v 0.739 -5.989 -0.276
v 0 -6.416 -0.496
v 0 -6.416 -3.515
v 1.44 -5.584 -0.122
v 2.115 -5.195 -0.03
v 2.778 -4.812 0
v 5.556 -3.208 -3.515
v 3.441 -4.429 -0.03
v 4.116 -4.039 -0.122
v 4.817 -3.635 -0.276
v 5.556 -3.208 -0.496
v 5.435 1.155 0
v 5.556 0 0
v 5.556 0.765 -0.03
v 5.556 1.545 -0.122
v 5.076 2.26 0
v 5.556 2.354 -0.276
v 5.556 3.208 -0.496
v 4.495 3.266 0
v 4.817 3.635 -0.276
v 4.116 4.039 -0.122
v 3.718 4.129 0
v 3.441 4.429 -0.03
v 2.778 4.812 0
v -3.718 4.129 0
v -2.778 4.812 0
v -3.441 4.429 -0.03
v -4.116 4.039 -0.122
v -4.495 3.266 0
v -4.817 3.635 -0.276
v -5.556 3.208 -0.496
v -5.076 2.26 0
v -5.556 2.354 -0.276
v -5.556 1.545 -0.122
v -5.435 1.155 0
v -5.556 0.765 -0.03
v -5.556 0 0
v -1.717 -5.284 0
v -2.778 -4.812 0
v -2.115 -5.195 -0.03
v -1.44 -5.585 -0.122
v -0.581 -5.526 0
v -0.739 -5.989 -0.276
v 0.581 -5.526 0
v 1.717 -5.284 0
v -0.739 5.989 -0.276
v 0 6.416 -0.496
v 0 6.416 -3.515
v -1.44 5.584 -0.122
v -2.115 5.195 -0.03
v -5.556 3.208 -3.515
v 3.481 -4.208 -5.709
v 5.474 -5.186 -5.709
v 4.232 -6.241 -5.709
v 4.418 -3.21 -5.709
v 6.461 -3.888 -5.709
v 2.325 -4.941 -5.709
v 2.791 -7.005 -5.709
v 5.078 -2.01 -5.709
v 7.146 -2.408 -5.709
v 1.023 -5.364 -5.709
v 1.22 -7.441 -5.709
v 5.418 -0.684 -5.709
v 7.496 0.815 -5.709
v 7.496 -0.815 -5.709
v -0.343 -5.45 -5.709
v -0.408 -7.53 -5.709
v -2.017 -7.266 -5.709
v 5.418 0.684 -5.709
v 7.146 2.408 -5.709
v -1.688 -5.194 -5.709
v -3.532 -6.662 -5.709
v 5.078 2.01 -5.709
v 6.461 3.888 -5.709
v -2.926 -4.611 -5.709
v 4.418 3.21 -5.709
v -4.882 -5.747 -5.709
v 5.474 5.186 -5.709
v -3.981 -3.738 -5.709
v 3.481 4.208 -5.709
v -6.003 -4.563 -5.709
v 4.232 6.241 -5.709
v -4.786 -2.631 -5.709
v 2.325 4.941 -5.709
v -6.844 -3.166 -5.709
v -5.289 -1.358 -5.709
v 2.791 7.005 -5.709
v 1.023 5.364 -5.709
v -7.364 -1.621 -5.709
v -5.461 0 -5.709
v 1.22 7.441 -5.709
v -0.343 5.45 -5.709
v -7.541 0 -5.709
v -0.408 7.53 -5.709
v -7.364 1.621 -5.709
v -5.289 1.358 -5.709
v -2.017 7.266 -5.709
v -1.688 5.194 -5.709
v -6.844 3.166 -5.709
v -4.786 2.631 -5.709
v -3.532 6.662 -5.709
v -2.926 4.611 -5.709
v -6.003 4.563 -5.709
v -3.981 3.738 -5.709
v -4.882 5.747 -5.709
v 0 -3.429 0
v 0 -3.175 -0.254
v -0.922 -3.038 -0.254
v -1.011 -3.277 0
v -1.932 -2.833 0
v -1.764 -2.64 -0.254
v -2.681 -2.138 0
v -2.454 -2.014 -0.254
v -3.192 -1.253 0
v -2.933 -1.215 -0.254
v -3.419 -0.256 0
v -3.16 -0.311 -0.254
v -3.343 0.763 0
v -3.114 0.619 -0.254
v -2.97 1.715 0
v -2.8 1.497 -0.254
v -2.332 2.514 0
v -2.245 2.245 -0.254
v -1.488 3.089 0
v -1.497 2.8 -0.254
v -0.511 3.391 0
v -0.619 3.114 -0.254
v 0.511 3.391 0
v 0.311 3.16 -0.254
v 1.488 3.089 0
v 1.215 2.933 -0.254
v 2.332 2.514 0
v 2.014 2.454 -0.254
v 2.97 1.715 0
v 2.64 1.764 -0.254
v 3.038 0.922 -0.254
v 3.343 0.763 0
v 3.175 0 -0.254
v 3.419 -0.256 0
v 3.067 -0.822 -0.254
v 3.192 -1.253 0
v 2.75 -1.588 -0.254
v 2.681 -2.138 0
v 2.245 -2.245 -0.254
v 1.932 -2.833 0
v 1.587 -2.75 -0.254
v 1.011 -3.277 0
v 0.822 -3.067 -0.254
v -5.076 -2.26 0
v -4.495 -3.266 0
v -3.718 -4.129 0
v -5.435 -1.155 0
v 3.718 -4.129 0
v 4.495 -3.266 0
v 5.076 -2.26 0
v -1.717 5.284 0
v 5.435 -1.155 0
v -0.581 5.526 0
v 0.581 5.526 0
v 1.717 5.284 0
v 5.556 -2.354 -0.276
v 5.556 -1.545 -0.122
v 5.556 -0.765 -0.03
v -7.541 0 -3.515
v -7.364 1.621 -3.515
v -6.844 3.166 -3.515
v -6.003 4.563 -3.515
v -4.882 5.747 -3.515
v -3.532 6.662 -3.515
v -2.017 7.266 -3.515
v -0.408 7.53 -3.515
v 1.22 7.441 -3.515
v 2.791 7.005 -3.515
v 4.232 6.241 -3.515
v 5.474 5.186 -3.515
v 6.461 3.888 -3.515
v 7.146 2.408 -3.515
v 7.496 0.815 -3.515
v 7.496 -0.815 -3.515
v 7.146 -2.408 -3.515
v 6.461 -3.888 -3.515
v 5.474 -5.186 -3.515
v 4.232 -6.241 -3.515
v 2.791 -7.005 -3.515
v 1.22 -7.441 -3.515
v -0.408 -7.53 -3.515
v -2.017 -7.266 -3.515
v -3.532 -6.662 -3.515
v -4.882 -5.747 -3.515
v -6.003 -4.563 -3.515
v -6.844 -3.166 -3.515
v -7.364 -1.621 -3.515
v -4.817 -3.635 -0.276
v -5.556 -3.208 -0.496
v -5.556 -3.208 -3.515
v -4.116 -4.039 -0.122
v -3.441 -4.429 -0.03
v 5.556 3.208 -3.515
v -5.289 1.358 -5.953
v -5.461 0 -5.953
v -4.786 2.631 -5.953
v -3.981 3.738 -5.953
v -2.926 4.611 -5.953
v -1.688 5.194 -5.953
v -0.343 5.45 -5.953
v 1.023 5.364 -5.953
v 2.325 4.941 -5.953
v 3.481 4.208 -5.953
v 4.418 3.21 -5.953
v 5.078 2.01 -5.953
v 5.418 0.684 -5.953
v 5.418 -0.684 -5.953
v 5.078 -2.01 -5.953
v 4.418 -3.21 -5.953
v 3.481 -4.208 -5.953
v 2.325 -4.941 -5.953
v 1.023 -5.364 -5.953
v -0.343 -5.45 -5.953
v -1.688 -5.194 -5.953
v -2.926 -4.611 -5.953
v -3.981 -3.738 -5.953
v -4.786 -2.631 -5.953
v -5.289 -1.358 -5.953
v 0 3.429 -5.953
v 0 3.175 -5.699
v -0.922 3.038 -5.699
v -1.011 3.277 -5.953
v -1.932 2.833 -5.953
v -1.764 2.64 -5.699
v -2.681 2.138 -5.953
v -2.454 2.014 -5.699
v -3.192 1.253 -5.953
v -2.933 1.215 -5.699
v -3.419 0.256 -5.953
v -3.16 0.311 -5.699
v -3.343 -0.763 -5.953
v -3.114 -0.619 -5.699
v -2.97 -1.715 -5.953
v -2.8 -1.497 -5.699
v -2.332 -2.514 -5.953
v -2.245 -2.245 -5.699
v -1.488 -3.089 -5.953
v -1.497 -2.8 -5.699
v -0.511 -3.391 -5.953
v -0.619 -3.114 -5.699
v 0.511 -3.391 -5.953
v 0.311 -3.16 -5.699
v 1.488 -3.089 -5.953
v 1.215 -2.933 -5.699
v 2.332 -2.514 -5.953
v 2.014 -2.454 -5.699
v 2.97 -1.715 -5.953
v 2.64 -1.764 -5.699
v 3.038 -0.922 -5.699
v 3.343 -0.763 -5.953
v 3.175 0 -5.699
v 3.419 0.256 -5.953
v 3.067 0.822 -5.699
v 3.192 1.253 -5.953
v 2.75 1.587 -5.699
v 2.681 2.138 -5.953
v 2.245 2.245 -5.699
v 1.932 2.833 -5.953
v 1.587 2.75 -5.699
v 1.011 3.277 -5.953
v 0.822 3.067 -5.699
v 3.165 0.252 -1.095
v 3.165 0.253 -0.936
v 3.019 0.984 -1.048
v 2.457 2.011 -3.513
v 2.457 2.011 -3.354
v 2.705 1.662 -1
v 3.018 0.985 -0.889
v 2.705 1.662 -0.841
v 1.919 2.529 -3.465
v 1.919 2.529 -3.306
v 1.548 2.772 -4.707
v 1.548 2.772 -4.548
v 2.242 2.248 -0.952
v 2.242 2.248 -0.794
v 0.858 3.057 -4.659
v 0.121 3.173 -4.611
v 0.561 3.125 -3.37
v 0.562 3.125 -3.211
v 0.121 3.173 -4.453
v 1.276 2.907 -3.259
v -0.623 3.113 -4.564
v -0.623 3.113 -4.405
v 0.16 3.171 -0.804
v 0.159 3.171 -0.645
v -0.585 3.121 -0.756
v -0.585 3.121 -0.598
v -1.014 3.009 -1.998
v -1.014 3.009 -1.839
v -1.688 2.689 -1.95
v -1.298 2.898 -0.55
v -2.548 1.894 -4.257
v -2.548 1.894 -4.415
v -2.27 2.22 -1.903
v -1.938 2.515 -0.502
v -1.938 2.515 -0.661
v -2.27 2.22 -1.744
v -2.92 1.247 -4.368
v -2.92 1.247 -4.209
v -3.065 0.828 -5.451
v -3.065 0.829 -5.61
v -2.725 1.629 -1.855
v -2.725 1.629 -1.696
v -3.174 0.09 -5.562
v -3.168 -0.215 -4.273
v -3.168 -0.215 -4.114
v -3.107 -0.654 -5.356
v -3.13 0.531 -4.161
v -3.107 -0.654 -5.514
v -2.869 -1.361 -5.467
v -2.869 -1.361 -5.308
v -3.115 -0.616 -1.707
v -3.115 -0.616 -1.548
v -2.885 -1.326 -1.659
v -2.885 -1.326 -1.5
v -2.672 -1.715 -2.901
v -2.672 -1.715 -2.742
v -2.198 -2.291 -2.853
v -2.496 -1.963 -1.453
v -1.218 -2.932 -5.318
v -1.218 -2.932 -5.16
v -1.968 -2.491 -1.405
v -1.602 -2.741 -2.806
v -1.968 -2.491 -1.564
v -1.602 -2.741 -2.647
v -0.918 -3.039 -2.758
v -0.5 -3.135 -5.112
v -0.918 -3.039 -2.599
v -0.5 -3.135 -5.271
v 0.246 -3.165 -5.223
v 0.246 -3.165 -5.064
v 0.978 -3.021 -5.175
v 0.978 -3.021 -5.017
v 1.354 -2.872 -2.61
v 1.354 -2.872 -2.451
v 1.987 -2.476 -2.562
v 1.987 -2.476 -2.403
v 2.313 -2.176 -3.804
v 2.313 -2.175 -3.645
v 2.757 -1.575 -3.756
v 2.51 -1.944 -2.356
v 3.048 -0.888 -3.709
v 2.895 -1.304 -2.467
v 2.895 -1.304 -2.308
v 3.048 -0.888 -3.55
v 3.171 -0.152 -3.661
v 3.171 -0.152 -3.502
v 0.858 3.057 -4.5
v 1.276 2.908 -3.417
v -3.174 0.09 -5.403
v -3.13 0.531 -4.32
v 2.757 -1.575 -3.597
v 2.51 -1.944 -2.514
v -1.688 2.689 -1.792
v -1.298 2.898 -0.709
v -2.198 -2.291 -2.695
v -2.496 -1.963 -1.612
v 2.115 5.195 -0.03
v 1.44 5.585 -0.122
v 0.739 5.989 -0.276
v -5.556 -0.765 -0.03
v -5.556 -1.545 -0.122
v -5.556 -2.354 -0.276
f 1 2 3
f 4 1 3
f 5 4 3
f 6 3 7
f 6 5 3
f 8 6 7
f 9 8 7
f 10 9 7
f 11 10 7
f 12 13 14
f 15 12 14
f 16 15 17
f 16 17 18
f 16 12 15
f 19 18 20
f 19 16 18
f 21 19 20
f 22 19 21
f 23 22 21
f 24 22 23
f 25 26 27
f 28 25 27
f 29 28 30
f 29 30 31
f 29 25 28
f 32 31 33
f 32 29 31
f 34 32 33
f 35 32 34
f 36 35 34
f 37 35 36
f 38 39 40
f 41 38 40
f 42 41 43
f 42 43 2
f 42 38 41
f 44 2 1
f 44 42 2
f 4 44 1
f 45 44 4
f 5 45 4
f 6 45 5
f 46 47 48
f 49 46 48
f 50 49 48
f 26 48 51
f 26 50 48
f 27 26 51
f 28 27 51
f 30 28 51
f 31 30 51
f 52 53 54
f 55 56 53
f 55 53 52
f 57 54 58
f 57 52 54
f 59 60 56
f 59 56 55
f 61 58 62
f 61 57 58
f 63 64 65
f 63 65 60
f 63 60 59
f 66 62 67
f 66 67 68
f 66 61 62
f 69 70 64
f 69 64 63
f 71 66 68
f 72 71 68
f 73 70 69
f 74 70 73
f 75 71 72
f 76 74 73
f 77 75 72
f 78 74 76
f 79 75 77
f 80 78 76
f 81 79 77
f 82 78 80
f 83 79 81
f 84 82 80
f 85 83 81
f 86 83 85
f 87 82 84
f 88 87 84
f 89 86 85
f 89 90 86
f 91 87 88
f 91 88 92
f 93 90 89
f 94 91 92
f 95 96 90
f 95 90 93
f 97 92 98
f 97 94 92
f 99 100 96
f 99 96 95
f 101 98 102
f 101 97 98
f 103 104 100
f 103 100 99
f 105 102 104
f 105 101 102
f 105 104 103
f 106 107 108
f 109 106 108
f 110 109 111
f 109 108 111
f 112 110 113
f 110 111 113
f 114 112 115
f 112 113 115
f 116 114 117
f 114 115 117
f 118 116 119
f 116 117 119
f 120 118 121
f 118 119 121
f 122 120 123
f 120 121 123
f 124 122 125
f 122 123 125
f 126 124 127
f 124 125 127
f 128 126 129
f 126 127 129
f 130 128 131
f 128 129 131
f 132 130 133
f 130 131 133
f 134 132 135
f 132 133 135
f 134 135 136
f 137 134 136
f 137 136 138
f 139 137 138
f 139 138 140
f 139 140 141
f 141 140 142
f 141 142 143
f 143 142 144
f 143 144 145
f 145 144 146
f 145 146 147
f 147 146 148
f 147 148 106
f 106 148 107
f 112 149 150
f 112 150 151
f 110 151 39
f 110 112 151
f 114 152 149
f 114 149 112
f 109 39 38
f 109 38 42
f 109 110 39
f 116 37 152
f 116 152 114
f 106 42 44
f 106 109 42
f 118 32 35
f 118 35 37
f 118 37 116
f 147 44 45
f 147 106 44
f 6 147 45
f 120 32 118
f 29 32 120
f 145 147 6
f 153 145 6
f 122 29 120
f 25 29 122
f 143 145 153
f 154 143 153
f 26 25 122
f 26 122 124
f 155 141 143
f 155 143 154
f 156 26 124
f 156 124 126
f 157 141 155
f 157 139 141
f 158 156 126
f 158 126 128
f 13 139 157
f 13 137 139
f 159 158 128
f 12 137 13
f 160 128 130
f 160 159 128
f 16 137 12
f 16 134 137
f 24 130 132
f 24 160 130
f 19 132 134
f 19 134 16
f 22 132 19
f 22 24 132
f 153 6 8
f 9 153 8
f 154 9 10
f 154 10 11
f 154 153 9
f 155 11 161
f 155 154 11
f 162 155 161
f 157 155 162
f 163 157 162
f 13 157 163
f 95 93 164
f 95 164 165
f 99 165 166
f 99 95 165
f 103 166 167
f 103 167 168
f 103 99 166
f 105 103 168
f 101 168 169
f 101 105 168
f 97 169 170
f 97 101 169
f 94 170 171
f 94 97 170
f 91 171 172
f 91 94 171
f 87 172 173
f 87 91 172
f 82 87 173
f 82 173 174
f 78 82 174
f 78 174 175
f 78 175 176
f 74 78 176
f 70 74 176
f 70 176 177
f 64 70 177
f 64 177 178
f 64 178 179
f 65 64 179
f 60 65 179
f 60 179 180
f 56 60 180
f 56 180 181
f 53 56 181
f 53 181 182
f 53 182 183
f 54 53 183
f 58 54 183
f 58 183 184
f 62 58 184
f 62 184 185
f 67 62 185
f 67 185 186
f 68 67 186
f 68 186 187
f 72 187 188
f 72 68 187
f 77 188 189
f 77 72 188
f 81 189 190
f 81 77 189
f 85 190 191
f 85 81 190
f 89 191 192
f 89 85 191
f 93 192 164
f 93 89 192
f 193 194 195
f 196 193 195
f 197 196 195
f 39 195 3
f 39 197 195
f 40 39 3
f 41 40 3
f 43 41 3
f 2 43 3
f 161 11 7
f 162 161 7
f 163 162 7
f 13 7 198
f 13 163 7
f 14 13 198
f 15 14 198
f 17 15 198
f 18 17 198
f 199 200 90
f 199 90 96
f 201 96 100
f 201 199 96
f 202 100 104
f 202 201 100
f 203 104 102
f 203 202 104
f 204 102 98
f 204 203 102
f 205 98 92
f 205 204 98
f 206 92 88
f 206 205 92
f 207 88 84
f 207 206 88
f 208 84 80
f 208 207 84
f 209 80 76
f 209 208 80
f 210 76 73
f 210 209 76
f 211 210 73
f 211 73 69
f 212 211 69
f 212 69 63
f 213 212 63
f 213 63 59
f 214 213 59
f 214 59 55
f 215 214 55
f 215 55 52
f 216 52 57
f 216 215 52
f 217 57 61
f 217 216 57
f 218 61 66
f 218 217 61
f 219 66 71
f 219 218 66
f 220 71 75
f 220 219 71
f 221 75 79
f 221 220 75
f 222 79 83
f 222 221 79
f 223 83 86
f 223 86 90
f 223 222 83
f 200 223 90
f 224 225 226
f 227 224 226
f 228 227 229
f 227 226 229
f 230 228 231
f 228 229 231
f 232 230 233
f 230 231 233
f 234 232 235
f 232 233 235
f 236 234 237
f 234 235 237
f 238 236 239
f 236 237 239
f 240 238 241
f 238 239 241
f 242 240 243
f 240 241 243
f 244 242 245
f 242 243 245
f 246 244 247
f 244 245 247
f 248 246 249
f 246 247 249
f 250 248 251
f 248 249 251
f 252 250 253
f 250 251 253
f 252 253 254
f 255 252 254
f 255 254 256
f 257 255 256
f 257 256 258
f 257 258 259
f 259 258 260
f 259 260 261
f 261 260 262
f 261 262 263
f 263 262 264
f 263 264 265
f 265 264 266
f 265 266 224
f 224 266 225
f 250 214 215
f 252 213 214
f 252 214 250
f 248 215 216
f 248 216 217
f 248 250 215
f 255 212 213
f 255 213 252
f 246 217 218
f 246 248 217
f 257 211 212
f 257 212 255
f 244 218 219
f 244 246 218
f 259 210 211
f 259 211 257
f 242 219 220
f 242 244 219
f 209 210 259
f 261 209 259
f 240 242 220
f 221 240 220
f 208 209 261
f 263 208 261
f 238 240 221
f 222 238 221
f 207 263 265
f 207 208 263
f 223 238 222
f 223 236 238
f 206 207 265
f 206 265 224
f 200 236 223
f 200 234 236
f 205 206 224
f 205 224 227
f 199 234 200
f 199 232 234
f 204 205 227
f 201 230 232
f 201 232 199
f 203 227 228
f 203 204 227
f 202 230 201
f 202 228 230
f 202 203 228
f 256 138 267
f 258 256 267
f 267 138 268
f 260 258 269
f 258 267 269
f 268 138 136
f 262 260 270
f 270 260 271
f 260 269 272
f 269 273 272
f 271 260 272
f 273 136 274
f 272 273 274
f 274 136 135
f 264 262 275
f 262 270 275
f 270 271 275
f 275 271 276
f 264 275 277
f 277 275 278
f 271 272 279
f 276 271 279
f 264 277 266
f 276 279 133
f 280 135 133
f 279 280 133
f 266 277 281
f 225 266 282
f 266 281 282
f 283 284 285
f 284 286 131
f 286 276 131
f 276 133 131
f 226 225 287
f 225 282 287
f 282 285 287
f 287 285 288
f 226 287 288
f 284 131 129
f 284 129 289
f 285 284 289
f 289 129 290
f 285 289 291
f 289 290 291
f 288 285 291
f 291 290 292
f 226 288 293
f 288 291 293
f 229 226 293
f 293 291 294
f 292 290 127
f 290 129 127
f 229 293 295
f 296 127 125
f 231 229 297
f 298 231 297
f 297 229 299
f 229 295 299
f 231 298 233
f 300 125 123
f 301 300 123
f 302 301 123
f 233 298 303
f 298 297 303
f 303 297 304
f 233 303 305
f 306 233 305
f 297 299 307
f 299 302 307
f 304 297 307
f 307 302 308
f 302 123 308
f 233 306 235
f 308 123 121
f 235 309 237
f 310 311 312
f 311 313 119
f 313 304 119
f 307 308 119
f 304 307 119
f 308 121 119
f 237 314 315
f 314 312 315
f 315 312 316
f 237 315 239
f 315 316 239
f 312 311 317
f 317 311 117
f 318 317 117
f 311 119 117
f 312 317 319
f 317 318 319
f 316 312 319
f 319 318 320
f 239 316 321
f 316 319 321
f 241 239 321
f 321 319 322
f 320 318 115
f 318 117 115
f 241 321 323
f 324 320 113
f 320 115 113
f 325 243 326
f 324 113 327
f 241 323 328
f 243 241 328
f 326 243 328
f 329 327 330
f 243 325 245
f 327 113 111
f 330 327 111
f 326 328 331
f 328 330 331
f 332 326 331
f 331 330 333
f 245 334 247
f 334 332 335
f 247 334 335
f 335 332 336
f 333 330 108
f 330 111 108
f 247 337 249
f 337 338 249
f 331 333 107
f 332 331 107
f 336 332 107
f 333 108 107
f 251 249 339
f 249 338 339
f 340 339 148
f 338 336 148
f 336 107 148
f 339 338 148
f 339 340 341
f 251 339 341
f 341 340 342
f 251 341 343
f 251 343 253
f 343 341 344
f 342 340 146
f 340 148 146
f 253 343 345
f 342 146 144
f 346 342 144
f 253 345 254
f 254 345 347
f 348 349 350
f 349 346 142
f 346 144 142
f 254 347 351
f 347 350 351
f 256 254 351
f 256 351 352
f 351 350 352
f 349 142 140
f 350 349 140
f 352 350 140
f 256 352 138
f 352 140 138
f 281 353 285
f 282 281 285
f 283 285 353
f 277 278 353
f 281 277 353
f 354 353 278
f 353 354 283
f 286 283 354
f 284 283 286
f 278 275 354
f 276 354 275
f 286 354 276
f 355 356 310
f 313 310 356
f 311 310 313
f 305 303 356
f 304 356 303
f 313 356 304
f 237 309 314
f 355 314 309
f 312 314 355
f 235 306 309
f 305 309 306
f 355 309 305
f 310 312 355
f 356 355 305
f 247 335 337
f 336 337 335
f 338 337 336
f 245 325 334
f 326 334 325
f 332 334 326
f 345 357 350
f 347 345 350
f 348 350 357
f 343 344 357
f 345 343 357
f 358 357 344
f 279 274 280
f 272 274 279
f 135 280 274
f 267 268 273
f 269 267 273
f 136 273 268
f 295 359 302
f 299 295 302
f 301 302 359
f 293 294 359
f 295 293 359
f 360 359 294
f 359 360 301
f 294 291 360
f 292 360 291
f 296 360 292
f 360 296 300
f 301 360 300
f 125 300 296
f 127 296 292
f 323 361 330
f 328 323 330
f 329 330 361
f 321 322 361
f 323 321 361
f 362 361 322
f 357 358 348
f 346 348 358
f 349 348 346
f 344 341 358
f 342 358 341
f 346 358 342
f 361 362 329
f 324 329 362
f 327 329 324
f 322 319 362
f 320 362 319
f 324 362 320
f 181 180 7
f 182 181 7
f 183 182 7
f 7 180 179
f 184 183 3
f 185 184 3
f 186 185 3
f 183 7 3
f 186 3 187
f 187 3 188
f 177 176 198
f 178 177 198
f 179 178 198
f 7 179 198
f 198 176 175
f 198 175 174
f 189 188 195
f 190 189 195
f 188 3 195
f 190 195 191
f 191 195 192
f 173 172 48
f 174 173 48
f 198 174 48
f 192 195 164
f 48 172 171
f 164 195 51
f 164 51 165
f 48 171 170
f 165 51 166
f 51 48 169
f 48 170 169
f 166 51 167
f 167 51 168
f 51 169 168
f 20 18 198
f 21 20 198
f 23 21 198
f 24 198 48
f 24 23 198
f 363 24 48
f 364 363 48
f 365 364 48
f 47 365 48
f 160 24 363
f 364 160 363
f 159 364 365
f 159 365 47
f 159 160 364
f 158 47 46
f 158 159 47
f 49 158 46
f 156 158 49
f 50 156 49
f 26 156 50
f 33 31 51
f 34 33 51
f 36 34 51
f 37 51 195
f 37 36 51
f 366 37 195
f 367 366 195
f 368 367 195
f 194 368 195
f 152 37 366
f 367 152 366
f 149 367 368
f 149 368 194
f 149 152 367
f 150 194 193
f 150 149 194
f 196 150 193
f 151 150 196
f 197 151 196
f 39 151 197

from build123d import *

# Parameters (mm, degrees)
EXTRUDE1_DEPTH         = 5.953125
SKETCH13_R             = 7.540625
EXTRUDE3_DEPTH         = 2.4384
SKETCH2_OUTSIDE_W      = 67.282
SKETCH2_OUTSIDE_H      = 67.282
SKETCH2_OUTSIDE_R      = 5.55625
CUT_EXTRUDE1_DEPTH     = 13.213179277
CUT_EXTRUDE1_DRAFT     = -60
SKETCH4_R              = 3.175
CUT_EXTRUDE3_DEPTH     = 13.213179277
CUT_SWEEP1_PITCH       = 1.27
CUT_SWEEP1_HEIGHT      = 7.223125
CUT_SWEEP1_RADIUS      = 3.175
CUT_SWEEP1_START_ANGLE = 90
SKETCH14_OUTSIDE_W     = 21.51
SKETCH14_OUTSIDE_H     = 21.51
SKETCH14_OUTSIDE_R     = 5.461
CUT_EXTRUDE8_DEPTH     = 0.24384


with BuildPart() as part:
    # Sketch1 → Extrude1 (new body)
    with BuildSketch(Plane.XY):
        Polygon((0, 6.415804866), (-5.55625, 3.207902433), (-5.55625, -3.207902433), (0, -6.415804866), (5.55625, -3.207902433), (5.55625, 3.207902433), align=None)
    extrude(amount=-EXTRUDE1_DEPTH)

    # Sketch13 → Extrude3 (add)
    with BuildSketch(Plane(origin=(0, 0, -5.953125), x_dir=(-1, 0, 0), z_dir=(0, 0, -1))):
        Circle(SKETCH13_R)
    extrude(amount=-EXTRUDE3_DEPTH)


with BuildPart() as cut_extrude1_tool:
    # Sketch2 outside → Cut-Extrude1 (with draft: the straight prism first)
    with BuildSketch(Plane.XY):
        Rectangle(SKETCH2_OUTSIDE_W, SKETCH2_OUTSIDE_H)
        Circle(SKETCH2_OUTSIDE_R, mode=Mode.SUBTRACT)
    extrude(amount=-CUT_EXTRUDE1_DEPTH)
    # Cut-Extrude1: the draft: its side faces are tilted about the plane it starts from
    cut_extrude1_sides = [cut_extrude1_tool.faces().sort_by_distance(p)[0] for p in [
        (0, -33.641, -6.606589638),
        (33.641, 0, -6.606589638),
        (0, 33.641, -6.606589638),
        (-33.641, 0, -6.606589638),
        (-5.55625, 0, -6.606589638),
    ]]
    draft(cut_extrude1_sides, Plane.XY, CUT_EXTRUDE1_DRAFT)


with BuildPart() as part_1:
    add(part.part)

    # Cut-Extrude1: cut by cut_extrude1_tool
    add(cut_extrude1_tool.part, mode=Mode.SUBTRACT)

    # Sketch4 → Cut-Extrude3 (cut, through all)
    with BuildSketch(Plane.XY):
        Circle(SKETCH4_R)
    extrude(amount=-CUT_EXTRUDE3_DEPTH, mode=Mode.SUBTRACT)

    # Cut-Sweep1: sweep along a helix
    with BuildLine() as cut_sweep1_path:
        add(Helix(CUT_SWEEP1_PITCH, CUT_SWEEP1_HEIGHT, CUT_SWEEP1_RADIUS, center=(0, 0, 0), direction=(0, 0, -1), mode=Mode.PRIVATE).rotate(Axis((0, 0, 0), (0, 0, -1)), CUT_SWEEP1_START_ANGLE))
    # Sketch9 → Cut-Sweep1 (sweep, cut)
    with BuildSketch(Plane(origin=(0, 0, 0), x_dir=(0, 0, -1), z_dir=(1, 0, 0))):
        Polygon((-0.635, 3.175), (-0.47625, 3.175), (0, 2.350110803), (-1.11125, 2.350110803), align=None)
    sweep(path=cut_sweep1_path.line, is_frenet=True, mode=Mode.SUBTRACT)

    # Cut-Extrude6 cone 1 section (through the dimple's axis) → Cut-Extrude6 (revolve, cut)
    with BuildSketch(Plane(origin=(0, 0, 0), x_dir=(0, -1, 0), z_dir=(1, 0, 0))):
        Polygon((0, 0), (3.429, 0), (0, 3.429), align=None)
    revolve(axis=Axis((0, 0, 0), (0, 0, -1)), mode=Mode.SUBTRACT)

    # Cut-Extrude7 cone 1 section (through the dimple's axis) → Cut-Extrude7 (revolve, cut)
    with BuildSketch(Plane(origin=(0, 0, -5.953125), x_dir=(0, 1, 0), z_dir=(1, 0, 0))):
        Polygon((0, 0), (3.429, 0), (0, 3.429), align=None)
    revolve(axis=Axis((0, 0, -5.953125), (0, 0, 1)), mode=Mode.SUBTRACT)

    # Sketch14 outside → Cut-Extrude8 (cut)
    with BuildSketch(Plane(origin=(0, 0, -5.953125), x_dir=(-1, 0, 0), z_dir=(0, 0, -1))):
        Rectangle(SKETCH14_OUTSIDE_W, SKETCH14_OUTSIDE_H)
        Circle(SKETCH14_OUTSIDE_R, mode=Mode.SUBTRACT)
    extrude(amount=-CUT_EXTRUDE8_DEPTH, mode=Mode.SUBTRACT)


solid = part_1.part
